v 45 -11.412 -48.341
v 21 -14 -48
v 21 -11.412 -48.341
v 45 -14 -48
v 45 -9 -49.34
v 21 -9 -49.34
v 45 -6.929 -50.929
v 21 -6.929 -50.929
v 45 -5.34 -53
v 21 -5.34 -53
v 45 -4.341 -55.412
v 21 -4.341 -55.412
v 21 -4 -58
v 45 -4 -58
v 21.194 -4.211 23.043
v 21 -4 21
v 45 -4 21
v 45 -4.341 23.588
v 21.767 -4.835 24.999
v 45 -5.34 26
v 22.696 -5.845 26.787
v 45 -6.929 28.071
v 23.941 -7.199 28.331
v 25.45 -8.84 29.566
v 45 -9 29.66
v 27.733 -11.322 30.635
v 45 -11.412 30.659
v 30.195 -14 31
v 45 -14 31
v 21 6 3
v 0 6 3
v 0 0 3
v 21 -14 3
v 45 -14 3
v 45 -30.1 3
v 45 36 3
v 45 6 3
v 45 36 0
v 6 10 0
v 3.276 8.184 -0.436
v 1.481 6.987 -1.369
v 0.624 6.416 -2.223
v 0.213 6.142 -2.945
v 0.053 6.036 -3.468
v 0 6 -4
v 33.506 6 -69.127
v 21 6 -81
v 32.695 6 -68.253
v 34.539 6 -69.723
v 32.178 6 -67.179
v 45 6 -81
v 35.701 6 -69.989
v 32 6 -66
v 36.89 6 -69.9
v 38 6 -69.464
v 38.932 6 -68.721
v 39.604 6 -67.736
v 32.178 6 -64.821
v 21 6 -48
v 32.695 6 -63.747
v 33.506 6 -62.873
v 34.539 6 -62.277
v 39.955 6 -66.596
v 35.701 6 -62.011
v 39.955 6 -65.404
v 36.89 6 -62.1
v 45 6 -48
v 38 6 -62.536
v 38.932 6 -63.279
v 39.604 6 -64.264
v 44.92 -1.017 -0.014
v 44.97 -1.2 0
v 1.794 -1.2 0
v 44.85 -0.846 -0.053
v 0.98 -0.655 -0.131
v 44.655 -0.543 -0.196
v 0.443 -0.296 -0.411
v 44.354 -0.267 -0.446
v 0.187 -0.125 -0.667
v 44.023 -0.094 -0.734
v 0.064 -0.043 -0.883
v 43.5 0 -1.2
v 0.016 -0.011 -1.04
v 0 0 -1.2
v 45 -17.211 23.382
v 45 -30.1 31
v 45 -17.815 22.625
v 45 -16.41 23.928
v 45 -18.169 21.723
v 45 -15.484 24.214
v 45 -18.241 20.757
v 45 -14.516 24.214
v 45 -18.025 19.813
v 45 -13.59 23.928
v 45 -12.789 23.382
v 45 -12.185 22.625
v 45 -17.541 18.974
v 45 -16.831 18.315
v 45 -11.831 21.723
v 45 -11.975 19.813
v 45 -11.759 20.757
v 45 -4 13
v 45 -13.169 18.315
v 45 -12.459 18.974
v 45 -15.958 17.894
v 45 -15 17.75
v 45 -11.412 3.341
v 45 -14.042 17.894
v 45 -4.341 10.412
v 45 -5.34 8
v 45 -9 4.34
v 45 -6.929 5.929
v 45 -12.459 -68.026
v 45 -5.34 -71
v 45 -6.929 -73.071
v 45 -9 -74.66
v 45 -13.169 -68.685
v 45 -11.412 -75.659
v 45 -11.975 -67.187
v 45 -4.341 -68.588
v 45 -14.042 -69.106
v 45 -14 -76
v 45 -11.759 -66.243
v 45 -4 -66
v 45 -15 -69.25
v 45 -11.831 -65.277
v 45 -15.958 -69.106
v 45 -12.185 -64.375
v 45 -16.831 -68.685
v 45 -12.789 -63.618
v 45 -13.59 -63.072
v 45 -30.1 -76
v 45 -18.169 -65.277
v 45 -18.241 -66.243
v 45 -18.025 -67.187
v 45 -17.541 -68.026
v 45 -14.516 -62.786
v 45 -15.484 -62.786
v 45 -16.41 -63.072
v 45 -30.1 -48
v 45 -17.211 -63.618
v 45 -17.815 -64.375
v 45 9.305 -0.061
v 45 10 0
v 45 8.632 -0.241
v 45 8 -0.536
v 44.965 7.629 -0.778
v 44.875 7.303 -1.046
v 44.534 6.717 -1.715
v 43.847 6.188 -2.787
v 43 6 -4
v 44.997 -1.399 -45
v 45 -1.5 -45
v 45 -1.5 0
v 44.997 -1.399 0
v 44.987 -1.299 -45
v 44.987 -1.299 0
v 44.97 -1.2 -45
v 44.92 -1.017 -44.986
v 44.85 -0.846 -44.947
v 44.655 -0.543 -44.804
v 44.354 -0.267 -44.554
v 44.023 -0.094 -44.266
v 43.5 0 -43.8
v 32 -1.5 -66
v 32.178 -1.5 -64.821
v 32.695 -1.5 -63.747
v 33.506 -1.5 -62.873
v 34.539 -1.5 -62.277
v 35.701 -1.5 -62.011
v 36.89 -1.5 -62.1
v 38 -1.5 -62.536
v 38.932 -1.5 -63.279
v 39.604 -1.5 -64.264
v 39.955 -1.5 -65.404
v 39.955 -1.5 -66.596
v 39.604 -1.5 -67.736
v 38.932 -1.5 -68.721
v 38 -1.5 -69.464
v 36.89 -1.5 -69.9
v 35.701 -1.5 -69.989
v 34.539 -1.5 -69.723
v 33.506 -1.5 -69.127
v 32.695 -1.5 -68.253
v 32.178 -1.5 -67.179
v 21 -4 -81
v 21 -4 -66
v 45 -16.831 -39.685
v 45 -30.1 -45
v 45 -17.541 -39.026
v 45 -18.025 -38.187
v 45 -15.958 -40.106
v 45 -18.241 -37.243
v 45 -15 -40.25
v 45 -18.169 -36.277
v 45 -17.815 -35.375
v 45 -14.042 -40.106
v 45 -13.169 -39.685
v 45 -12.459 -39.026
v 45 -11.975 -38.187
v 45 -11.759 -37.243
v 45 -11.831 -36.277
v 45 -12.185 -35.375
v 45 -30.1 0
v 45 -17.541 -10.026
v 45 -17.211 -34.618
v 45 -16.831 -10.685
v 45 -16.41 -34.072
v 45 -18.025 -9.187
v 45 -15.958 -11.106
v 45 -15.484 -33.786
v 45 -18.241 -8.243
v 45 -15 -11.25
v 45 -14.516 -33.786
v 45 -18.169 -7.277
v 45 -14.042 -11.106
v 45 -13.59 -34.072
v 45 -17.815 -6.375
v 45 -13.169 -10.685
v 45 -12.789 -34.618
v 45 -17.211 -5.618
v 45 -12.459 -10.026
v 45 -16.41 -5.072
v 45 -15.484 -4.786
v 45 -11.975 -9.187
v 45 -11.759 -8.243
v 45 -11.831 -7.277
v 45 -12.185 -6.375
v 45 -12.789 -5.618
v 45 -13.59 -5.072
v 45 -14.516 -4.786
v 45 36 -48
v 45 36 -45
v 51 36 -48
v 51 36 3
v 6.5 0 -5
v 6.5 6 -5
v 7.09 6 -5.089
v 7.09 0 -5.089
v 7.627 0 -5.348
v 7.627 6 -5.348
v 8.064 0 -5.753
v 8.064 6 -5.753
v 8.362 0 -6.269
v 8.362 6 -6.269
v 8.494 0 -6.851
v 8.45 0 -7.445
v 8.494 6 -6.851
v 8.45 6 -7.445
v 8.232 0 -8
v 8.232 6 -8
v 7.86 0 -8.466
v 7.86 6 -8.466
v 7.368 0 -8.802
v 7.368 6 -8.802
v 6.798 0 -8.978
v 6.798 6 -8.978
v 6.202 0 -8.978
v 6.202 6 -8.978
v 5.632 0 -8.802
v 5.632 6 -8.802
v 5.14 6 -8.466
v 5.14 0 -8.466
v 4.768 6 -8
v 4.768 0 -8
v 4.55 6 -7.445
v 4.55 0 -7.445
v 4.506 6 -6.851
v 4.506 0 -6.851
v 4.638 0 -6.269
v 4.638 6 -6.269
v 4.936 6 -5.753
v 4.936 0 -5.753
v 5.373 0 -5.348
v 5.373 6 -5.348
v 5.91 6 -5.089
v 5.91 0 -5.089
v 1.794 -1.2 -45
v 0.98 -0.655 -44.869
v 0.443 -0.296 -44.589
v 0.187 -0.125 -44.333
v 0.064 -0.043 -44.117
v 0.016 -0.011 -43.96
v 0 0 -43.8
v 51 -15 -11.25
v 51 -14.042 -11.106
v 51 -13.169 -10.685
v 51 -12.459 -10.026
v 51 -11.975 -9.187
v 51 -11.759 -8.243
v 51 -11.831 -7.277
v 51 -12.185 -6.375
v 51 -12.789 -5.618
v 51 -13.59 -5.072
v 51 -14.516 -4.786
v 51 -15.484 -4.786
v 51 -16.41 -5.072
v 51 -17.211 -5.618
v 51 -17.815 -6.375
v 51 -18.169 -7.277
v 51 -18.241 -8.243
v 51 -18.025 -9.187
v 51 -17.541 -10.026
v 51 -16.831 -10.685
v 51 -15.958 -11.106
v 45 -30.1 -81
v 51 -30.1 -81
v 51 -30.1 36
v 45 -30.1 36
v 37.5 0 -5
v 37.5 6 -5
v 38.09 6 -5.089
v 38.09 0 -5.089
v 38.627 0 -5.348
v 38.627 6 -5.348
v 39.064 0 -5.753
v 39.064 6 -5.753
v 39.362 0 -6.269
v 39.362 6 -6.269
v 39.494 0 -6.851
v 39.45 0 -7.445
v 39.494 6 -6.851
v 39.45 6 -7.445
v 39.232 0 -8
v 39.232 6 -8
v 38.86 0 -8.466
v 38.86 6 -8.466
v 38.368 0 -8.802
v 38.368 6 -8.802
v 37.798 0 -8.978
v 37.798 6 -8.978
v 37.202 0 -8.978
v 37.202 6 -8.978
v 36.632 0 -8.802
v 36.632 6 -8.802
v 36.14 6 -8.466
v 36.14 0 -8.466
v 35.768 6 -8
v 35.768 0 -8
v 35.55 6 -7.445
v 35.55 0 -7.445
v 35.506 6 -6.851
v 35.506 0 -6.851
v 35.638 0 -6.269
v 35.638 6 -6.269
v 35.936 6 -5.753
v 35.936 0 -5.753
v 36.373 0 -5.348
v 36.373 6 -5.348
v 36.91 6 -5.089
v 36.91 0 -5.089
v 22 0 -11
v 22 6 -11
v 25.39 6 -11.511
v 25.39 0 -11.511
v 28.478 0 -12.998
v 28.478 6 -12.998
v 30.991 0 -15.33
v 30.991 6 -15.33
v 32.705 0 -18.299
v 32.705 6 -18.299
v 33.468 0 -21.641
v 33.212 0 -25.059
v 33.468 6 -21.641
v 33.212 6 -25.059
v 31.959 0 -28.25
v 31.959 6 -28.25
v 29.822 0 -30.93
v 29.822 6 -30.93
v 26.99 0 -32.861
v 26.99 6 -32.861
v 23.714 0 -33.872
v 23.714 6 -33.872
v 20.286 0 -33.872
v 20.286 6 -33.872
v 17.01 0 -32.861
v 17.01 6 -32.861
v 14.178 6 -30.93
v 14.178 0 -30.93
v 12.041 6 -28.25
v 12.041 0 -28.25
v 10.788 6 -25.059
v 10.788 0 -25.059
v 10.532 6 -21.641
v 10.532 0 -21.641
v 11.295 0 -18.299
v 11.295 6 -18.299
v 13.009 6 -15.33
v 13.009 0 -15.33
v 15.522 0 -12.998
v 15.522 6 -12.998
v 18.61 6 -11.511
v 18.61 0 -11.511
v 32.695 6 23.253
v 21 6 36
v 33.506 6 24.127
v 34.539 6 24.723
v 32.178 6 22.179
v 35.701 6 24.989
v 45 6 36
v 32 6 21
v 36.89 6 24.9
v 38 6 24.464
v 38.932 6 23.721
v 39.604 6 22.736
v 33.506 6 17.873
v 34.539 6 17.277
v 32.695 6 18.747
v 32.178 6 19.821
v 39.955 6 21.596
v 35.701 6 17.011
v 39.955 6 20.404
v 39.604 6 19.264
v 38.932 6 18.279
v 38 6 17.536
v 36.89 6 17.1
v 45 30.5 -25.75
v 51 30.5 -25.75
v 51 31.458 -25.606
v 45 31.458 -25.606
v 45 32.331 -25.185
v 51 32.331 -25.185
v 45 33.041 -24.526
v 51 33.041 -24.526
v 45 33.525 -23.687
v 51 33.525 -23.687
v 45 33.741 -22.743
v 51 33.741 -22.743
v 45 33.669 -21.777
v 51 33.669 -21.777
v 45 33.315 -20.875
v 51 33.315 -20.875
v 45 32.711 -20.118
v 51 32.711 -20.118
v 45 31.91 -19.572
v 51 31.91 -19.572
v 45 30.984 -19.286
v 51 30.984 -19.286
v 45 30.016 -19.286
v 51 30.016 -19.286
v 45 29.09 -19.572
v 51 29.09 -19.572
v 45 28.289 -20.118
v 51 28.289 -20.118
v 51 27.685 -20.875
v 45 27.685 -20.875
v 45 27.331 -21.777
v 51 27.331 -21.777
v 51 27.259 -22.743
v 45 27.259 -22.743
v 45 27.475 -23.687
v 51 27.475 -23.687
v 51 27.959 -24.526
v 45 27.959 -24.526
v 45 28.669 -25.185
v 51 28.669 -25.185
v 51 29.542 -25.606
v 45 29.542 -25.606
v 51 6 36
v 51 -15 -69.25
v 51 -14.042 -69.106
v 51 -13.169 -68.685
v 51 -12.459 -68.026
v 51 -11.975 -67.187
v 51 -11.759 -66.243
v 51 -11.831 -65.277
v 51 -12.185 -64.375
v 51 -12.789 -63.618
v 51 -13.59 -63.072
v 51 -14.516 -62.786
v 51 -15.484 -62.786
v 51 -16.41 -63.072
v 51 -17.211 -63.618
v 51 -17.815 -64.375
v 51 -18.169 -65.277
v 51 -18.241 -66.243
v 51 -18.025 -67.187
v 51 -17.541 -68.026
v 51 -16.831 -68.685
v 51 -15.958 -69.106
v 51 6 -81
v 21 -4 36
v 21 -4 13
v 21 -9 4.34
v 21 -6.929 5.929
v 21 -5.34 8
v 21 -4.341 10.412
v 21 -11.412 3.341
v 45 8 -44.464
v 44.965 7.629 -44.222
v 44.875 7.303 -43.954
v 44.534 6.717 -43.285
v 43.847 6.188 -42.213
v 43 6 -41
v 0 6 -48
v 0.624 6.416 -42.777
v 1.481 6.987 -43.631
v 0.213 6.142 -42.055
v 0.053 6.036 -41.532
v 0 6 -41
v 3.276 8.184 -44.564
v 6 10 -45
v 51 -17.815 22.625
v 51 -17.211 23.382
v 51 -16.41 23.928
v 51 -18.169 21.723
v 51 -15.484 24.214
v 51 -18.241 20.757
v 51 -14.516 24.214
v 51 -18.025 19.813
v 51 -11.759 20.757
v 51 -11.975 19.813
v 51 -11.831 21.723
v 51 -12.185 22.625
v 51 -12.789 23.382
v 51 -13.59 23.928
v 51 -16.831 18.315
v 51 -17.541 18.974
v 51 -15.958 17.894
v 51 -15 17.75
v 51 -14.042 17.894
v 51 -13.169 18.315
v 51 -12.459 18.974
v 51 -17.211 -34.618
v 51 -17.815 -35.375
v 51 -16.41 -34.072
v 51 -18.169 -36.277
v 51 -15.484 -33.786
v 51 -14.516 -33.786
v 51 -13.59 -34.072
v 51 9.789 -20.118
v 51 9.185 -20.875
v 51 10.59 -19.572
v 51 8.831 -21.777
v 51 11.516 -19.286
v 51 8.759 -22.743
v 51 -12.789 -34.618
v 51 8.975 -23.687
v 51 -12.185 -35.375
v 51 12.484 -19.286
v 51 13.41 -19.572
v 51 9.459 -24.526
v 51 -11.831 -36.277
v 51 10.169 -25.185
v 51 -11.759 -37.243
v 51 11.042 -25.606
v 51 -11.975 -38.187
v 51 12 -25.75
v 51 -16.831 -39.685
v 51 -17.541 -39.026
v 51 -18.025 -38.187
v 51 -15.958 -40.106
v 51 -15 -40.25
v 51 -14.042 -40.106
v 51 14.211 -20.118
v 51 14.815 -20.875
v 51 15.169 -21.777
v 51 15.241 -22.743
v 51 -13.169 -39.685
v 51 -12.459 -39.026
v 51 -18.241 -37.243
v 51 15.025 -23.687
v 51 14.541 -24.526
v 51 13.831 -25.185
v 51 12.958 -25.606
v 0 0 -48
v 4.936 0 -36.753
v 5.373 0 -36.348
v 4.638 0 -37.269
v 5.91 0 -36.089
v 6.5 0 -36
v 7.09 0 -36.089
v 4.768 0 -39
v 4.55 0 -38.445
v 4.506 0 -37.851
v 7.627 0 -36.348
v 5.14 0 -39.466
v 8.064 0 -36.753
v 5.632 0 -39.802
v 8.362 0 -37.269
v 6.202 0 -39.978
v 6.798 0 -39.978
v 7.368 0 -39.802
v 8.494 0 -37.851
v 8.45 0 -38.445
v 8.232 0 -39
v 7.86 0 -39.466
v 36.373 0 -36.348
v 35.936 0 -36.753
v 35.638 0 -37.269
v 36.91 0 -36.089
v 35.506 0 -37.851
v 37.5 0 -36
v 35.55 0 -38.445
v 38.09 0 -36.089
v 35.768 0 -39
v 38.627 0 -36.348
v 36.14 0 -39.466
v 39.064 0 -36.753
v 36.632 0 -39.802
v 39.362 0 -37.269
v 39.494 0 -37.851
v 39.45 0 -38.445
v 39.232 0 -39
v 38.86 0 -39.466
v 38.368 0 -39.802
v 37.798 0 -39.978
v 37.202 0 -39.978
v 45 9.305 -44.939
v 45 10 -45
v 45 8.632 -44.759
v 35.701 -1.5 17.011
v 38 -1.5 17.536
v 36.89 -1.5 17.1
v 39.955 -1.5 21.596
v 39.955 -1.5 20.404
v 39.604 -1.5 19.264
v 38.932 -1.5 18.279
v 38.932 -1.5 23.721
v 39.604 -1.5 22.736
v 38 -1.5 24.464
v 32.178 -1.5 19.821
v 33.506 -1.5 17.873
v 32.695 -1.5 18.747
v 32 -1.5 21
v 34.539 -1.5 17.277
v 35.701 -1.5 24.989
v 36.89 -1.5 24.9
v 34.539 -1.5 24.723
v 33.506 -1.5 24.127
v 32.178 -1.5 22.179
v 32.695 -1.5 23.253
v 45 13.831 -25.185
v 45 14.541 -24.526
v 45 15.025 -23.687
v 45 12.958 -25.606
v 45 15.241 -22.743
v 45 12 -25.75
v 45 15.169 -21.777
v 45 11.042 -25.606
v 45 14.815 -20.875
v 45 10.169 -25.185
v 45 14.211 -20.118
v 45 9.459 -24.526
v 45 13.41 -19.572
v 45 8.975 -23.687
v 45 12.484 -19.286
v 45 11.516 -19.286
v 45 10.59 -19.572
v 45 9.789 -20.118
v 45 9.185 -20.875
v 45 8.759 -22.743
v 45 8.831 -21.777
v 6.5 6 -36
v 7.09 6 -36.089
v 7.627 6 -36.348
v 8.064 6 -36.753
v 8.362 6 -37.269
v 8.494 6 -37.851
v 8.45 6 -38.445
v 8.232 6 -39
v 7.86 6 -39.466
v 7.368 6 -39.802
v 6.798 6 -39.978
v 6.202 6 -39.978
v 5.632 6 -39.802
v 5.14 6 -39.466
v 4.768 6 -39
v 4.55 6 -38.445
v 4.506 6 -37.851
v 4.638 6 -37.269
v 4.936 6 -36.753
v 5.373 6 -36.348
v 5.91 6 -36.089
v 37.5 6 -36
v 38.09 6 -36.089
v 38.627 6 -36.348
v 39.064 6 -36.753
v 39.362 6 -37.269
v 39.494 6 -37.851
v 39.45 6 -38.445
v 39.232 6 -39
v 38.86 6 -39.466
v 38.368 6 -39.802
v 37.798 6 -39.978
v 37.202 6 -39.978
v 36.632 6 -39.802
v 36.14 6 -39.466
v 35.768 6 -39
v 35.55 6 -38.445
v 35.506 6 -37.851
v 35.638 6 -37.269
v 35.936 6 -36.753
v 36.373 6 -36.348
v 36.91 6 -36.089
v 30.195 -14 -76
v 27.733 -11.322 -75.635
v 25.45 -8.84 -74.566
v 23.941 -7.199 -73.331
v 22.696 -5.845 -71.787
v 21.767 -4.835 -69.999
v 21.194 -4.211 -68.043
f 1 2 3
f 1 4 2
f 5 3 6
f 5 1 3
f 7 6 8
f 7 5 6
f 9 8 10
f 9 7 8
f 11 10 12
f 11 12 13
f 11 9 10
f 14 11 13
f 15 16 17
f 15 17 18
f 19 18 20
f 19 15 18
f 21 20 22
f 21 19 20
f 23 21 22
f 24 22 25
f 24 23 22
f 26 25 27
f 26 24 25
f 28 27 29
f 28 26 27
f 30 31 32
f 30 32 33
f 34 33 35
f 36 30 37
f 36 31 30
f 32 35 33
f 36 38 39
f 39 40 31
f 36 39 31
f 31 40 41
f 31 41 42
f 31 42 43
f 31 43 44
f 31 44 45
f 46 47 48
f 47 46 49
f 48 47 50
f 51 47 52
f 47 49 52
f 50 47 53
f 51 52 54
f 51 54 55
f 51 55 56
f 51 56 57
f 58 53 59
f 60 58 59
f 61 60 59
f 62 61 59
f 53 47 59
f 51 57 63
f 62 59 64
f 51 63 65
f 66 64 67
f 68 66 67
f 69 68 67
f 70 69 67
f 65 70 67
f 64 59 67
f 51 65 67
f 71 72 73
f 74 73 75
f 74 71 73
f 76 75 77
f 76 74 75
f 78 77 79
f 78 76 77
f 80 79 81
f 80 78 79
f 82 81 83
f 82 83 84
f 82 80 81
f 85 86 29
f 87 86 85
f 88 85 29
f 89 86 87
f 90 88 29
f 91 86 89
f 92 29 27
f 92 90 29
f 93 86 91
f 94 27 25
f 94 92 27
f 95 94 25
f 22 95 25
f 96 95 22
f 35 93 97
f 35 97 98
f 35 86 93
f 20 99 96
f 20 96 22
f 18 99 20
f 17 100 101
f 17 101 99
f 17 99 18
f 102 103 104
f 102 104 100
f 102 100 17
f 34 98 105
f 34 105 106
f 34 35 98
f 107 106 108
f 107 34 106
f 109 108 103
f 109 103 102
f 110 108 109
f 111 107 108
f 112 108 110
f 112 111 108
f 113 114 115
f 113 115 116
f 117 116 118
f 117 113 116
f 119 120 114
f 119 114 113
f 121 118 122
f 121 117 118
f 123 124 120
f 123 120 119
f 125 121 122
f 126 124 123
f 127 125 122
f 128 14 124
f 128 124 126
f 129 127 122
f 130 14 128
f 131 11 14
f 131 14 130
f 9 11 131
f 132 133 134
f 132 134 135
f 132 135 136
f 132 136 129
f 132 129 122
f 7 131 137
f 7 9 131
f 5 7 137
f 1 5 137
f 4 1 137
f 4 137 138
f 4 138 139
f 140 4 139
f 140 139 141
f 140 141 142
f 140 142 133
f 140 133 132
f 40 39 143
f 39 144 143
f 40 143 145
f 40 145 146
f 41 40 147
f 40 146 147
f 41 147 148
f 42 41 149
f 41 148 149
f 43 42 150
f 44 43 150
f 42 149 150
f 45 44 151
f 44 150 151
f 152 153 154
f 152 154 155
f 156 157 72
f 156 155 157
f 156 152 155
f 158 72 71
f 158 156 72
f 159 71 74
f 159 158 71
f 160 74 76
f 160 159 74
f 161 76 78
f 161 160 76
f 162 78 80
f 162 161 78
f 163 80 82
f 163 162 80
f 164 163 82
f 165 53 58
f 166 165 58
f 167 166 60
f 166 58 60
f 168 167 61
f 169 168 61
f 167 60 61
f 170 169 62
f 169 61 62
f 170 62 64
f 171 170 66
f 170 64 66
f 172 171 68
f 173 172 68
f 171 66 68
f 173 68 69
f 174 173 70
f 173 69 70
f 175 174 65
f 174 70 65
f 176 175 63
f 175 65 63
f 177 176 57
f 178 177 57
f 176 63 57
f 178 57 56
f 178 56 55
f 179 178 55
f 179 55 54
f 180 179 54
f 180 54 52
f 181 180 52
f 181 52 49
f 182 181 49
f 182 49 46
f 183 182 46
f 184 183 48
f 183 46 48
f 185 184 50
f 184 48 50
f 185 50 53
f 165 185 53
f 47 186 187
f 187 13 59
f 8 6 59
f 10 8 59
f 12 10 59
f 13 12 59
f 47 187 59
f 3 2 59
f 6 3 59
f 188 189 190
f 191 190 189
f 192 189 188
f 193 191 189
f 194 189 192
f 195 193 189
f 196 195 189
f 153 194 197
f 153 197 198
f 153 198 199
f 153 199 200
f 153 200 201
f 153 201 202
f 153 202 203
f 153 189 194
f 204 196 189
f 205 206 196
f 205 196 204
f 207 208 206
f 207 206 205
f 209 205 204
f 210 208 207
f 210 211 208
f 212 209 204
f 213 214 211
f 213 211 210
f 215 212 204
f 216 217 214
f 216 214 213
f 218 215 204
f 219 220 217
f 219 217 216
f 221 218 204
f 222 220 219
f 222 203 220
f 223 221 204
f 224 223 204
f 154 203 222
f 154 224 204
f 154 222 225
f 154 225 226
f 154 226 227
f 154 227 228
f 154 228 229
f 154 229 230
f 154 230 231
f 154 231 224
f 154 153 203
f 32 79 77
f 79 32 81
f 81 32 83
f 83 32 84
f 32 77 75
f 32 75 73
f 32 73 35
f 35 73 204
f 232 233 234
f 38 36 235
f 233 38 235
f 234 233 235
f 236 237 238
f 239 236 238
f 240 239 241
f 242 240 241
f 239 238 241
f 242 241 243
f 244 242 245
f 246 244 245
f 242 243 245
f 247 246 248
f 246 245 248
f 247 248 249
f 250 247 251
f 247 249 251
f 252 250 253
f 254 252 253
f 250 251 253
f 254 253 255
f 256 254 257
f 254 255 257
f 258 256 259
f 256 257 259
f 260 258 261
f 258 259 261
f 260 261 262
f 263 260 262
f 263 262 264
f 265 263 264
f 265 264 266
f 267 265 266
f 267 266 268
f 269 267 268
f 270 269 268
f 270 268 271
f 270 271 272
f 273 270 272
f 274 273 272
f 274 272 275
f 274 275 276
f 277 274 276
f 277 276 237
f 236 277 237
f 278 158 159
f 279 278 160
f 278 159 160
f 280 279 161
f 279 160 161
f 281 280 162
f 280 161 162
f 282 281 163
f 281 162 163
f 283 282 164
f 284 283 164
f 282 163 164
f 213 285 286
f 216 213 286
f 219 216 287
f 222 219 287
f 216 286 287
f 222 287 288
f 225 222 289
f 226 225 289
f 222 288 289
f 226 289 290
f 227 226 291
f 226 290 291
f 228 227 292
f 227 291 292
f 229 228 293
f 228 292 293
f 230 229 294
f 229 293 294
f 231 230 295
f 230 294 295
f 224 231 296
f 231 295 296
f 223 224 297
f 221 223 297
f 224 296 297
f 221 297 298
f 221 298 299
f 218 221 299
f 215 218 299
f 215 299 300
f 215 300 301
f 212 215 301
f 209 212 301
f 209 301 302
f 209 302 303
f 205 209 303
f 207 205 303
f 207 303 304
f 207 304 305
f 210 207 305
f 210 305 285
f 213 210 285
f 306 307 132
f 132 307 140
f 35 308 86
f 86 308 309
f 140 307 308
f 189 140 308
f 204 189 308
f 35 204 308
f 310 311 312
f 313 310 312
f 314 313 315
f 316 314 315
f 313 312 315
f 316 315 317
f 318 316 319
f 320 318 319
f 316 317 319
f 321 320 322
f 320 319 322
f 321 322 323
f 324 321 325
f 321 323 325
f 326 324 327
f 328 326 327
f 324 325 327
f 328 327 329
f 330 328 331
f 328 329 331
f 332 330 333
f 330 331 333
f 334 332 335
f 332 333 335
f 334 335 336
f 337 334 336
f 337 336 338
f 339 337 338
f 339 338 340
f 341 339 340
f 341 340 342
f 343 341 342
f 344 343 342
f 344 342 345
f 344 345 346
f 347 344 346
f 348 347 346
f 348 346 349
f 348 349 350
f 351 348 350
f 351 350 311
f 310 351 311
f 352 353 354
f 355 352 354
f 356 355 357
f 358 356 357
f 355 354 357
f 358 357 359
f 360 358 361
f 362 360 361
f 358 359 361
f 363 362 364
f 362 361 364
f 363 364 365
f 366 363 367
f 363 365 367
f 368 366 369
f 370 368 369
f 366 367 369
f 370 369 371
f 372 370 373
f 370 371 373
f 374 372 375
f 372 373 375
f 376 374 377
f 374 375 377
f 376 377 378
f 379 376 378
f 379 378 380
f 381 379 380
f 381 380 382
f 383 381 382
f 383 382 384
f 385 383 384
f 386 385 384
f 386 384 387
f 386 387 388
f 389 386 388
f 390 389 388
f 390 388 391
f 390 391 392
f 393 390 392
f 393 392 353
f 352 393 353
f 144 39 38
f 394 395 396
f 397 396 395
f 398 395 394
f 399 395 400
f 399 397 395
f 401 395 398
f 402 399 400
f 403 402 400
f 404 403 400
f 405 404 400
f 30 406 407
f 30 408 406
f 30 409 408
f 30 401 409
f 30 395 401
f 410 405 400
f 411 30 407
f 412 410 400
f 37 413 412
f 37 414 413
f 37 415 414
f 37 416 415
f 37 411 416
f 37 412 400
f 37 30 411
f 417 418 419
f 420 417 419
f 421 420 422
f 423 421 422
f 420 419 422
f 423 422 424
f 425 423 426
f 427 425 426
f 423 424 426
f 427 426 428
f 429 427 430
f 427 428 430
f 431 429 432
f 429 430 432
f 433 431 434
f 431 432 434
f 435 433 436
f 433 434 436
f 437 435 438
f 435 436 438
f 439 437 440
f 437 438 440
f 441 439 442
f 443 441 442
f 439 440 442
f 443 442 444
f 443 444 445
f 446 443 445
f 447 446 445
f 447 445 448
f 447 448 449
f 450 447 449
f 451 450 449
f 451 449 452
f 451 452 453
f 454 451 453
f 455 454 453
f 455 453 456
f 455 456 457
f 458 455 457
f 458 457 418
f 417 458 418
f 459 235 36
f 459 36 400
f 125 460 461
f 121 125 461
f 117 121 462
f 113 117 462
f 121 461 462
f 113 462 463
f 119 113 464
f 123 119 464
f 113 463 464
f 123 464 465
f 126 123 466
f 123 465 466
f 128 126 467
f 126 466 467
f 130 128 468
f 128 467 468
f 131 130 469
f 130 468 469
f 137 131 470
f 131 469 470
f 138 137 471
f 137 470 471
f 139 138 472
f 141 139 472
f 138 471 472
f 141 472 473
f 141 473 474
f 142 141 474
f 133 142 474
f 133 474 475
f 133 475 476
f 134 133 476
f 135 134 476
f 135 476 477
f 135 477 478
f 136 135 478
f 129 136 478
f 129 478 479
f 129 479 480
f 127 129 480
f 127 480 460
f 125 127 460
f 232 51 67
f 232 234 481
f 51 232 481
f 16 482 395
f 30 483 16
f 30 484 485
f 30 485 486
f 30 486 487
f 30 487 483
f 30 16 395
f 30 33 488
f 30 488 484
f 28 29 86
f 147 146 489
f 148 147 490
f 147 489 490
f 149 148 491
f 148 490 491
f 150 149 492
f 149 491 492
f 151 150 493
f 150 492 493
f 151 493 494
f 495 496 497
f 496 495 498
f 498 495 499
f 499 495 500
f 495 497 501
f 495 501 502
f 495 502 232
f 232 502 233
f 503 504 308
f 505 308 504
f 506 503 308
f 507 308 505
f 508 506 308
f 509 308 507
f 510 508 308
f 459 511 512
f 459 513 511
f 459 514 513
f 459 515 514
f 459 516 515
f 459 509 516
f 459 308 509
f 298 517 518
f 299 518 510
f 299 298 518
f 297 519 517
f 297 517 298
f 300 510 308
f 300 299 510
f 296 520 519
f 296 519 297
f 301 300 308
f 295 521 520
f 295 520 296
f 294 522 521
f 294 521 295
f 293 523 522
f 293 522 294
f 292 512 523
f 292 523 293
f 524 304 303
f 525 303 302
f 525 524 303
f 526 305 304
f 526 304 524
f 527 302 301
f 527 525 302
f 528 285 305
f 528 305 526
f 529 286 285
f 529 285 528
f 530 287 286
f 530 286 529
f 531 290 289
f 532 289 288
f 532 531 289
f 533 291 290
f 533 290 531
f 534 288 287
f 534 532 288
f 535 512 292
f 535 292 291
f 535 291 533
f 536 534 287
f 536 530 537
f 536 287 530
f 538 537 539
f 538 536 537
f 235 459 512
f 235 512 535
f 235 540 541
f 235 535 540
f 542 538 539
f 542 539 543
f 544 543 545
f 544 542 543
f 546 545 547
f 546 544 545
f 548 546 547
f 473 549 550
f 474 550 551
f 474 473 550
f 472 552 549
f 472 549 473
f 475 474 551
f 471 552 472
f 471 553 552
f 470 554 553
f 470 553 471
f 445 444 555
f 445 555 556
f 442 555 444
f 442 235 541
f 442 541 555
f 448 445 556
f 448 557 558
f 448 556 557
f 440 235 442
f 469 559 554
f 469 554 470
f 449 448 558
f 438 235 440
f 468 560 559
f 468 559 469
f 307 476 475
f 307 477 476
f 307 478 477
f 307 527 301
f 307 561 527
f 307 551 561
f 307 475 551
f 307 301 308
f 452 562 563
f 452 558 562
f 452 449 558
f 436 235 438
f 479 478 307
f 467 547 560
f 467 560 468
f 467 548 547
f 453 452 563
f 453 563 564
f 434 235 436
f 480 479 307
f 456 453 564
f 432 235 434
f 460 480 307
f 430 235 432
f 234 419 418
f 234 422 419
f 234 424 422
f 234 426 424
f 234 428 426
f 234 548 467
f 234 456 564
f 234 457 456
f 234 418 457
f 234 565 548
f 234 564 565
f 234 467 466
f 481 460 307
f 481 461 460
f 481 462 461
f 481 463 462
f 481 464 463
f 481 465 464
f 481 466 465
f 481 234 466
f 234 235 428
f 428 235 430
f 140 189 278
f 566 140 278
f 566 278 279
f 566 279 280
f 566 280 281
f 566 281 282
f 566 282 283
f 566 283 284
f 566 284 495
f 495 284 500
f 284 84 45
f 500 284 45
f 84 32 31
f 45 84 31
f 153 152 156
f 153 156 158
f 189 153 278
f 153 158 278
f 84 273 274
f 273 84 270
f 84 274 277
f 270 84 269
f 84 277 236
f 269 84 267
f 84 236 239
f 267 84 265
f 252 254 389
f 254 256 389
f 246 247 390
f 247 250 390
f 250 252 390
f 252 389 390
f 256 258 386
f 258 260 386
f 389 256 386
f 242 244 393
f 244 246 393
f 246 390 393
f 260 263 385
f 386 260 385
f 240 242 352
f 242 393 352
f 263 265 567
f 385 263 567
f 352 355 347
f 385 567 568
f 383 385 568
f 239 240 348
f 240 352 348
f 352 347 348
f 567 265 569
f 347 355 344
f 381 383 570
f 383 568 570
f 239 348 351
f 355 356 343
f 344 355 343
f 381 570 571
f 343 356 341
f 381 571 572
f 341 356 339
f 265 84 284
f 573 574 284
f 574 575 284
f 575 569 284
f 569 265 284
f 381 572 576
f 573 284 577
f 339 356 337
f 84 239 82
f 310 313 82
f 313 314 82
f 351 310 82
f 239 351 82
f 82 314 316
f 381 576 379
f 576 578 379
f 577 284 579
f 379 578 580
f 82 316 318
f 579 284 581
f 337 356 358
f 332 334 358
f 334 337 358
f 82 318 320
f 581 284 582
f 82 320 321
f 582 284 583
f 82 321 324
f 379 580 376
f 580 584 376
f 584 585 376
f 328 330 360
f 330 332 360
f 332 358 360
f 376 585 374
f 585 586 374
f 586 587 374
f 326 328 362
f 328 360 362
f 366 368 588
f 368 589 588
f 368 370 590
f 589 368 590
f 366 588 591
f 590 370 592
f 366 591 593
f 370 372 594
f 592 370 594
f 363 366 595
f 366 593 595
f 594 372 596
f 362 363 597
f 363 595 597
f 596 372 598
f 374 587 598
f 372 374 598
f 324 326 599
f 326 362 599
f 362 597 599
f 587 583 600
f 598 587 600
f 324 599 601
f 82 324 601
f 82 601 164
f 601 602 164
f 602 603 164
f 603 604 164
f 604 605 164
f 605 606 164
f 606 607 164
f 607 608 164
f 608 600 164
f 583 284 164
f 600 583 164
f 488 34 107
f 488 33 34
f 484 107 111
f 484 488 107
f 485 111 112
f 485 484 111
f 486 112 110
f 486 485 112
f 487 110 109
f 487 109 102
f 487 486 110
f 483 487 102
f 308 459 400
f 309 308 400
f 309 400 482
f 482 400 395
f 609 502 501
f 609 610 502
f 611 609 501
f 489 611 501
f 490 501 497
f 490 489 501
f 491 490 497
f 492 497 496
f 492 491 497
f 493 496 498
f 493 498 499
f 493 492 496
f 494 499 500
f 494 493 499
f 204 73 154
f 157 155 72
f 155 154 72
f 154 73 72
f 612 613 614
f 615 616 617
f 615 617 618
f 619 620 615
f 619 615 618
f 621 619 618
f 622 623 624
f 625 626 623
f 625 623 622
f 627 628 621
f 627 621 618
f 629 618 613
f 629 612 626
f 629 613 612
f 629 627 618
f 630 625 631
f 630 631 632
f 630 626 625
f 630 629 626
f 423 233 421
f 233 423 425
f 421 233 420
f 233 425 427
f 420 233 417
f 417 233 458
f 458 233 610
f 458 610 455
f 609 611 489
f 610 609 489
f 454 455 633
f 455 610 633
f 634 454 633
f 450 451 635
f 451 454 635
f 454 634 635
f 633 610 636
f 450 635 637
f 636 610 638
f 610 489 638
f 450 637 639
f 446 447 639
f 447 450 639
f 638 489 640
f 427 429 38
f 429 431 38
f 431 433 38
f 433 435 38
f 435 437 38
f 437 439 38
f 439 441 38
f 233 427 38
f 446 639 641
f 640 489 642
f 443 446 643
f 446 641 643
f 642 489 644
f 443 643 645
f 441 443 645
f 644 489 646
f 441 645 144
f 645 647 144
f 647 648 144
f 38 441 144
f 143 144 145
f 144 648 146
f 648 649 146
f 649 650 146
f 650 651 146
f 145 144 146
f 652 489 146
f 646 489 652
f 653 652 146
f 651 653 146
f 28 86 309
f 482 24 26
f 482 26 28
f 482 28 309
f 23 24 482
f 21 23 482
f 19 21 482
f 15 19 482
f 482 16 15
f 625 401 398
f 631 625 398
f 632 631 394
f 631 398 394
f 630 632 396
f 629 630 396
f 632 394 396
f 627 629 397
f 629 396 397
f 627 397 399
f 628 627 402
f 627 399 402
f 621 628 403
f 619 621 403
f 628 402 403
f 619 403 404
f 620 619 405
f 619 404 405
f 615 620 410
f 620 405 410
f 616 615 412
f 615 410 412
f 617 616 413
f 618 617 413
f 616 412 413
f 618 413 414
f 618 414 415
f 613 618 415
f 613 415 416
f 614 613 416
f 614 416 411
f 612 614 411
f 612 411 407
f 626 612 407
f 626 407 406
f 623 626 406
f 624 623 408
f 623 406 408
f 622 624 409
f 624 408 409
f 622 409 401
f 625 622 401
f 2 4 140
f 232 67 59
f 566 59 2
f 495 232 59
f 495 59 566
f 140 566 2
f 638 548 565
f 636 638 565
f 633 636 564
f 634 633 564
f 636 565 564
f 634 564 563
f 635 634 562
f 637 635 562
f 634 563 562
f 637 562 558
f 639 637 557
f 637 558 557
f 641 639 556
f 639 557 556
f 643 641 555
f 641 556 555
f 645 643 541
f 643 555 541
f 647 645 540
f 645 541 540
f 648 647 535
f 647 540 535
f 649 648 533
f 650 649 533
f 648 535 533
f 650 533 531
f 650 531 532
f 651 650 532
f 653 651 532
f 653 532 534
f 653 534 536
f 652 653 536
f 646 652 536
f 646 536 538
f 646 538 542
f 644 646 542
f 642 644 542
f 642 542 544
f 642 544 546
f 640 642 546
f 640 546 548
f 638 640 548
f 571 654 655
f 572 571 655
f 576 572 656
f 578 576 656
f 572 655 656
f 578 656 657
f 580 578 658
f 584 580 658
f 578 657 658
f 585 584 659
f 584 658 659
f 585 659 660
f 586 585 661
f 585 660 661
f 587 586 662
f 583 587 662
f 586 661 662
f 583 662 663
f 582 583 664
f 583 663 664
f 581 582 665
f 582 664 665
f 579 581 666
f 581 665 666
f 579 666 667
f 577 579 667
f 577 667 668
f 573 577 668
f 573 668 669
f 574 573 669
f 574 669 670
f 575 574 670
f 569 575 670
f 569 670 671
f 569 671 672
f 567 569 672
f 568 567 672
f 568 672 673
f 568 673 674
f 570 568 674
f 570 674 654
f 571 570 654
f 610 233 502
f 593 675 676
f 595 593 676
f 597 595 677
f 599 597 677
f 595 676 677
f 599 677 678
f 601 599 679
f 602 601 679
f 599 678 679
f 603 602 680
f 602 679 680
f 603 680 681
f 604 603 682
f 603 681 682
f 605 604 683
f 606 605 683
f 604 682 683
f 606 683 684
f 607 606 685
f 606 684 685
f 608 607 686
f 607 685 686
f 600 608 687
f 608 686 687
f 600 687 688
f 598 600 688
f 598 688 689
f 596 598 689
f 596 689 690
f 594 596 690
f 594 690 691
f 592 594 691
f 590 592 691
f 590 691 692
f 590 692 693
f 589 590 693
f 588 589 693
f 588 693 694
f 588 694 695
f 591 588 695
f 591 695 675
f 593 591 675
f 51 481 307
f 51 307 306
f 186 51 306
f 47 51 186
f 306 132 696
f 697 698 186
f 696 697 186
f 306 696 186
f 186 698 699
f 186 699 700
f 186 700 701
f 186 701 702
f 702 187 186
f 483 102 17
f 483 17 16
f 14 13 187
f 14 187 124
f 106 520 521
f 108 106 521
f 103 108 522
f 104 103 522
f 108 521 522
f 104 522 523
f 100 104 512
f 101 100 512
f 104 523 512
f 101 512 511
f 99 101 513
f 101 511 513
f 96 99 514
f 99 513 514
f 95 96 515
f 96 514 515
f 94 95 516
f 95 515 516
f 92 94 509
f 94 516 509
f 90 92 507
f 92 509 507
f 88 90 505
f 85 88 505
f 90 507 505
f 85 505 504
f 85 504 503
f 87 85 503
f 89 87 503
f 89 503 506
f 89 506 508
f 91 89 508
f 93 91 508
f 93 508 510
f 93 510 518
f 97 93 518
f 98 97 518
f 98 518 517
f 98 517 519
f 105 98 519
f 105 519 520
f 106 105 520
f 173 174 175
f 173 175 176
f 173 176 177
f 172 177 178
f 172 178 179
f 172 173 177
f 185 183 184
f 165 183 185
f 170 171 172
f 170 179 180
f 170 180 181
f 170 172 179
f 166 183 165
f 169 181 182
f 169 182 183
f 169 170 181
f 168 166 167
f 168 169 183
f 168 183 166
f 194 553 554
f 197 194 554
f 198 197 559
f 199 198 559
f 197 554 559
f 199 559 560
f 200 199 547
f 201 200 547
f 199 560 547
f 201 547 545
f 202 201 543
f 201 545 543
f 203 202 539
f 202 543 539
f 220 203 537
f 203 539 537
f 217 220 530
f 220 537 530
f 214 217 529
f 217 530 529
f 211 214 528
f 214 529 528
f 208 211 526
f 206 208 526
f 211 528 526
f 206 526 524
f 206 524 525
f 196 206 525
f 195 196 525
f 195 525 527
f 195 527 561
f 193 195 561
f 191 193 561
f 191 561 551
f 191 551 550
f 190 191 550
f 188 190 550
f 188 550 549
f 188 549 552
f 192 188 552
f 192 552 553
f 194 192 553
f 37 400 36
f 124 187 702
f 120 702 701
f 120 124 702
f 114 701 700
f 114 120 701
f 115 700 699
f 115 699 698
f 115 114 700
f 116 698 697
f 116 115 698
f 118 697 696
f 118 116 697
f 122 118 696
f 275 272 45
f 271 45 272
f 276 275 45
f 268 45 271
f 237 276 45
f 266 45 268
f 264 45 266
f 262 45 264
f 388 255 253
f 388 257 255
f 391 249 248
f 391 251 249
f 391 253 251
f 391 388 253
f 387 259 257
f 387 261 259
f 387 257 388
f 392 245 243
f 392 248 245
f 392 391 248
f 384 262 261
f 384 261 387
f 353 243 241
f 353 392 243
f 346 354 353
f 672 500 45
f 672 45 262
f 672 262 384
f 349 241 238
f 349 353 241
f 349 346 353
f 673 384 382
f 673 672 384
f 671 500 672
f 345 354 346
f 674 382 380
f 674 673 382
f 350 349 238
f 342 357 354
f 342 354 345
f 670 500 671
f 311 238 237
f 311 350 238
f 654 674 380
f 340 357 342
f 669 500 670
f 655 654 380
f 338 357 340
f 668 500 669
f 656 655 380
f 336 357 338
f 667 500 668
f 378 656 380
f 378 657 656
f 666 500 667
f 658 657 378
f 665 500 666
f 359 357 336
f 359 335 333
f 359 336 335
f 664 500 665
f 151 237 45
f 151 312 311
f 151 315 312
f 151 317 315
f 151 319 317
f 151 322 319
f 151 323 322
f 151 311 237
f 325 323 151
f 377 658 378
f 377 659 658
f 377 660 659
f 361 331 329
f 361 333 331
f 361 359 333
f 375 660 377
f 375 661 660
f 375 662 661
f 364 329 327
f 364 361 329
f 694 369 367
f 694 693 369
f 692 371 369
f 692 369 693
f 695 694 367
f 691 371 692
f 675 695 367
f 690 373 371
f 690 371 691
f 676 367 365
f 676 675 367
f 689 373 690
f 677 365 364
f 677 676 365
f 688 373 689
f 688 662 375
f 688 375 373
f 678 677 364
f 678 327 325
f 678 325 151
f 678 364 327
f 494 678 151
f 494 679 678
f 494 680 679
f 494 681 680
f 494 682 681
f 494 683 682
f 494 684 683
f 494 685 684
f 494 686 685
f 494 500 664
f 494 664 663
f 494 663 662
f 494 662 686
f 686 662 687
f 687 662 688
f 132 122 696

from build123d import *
from OCP.BRepFilletAPI import BRepFilletAPI_MakeFillet

# Parameters (mm, degrees)
SKETCH2_W                  = 45
SKETCH2_H                  = 45
BOSS_EXTRUDE1_DEPTH        = 6
SKETCH4_R                  = 11.5
SKETCH4_R_2                = 2
CUT_EXTRUDE1_DEPTH         = 64.921827258
SKETCH5_W                  = 6
SKETCH5_H                  = 45
BOSS_EXTRUDE2_DEPTH        = 30.1
BOSS_EXTRUDE2_DEPTH_BACK   = 36
BOSS_EXTRUDE3_DEPTH        = 3
BOSS_EXTRUDE4_DEPTH        = 3
BOSS_EXTRUDE5_DEPTH        = 28
BOSS_EXTRUDE6_DEPTH        = 5
FILLET3_R                  = 10
FILLET4_R1                 = 4
FILLET4_R2                 = 2
FILLET4_R3                 = 1.2
FILLET4_R4                 = 1.5
BOSS_EXTRUDE7_DEPTH        = 28
BOSS_EXTRUDE8_DEPTH        = 5
FILLET5_R                  = 10
F_6_5_6_5_DIAMETER_HOLE1_D = 6.5
SKETCH14_R                 = 4
CUT_EXTRUDE2_DEPTH         = 7.5
BOSS_EXTRUDE9_DEPTH        = 6


with BuildPart() as part:
    # Sketch2 → Boss-Extrude1 (new body)
    with BuildSketch(Plane(origin=(0, 0, 0), x_dir=(1, 0, 0), z_dir=(0, 1, 0))):
        with Locations((22.5, 22.5)):
            Rectangle(SKETCH2_W, SKETCH2_H)
    extrude(amount=BOSS_EXTRUDE1_DEPTH)

    # Sketch4 → Cut-Extrude1 (cut, through all)
    with BuildSketch(Plane(origin=(0, 6, 0), x_dir=(-1, 0, 0), z_dir=(0, 1, 0))):
        with Locations(Location((-22, -22.5, 0), (0, 0, 90))):
            Circle(SKETCH4_R)
        with Locations(Location((-37.5, -7, 0), (0, 0, 90))):
            Circle(SKETCH4_R_2)
        with Locations(Location((-6.5, -7, 0), (0, 0, 90))):
            Circle(SKETCH4_R_2)
        with Locations(Location((-6.5, -38, 0), (0, 0, 90))):
            Circle(SKETCH4_R_2)
        with Locations(Location((-37.5, -38, 0), (0, 0, 90))):
            Circle(SKETCH4_R_2)
    extrude(amount=-CUT_EXTRUDE1_DEPTH, mode=Mode.SUBTRACT)

    # Sketch5 → Boss-Extrude2 (add, two sides)
    with BuildSketch(Plane.XZ) as boss_extrude2_sk:
        with Locations((48, -22.5)):
            Rectangle(SKETCH5_W, SKETCH5_H)
    extrude(amount=BOSS_EXTRUDE2_DEPTH)
    extrude(boss_extrude2_sk.sketch, amount=-BOSS_EXTRUDE2_DEPTH_BACK)

    # Sketch8 → Boss-Extrude3 (add)
    with BuildSketch(Plane.XY):
        Polygon((45, 36), (0, 6), (0, 0), (45, -30.1), (51, -30.1), (51, 36), align=None)
    extrude(amount=BOSS_EXTRUDE3_DEPTH)

    # Sketch9 → Boss-Extrude4 (add)
    with BuildSketch(Plane(origin=(0, 0, -45), x_dir=(-1, 0, 0), z_dir=(0, 0, -1))):
        Polygon((0, 6), (-45, 36), (-51, 36), (-51, -30.1), (-45, -30.1), (0, 0), align=None)
    extrude(amount=BOSS_EXTRUDE4_DEPTH)

    # Sketch11 → Boss-Extrude5 (add)
    with BuildSketch(Plane.XY.offset(3)):
        Polygon((51, -30.1), (45, -30.1), (45, -4), (21, -4), (21, 6), (51, 6), align=None)
    extrude(amount=BOSS_EXTRUDE5_DEPTH)

    # Sketch12 → Boss-Extrude6 (add)
    with BuildSketch(Plane.XY.offset(31)):
        Polygon((45, -30.1), (21, -4), (21, 6), (51, 6), (51, -30.1), align=None)
    extrude(amount=BOSS_EXTRUDE6_DEPTH)

    # Fillet3
    fillet3_edges = [part.edges().sort_by_distance(p)[0] for p in [
        (33, -4, 3),
        (33, -4, 31),
    ]]
    fillet(fillet3_edges, radius=FILLET3_R)

    # Fillet4: one fillet with a radius per group of edges: ONE call of the kernel's fillet builder (fillet() takes one radius for all edges)
    fillet4_edges_1 = [part.edges().sort_by_distance(p)[0] for p in [
        (22.5, 6, -45),
        (22.5, 6, 0),
    ]]
    fillet4_edges_2 = [part.edges().sort_by_distance(p)[0] for p in [
        (45, 6, -22.5),
    ]]
    fillet4_edges_3 = [part.edges().sort_by_distance(p)[0] for p in [
        (22.5, 0, -45),
        (22.5, 0, 0),
    ]]
    fillet4_edges_4 = [part.edges().sort_by_distance(p)[0] for p in [
        (45, 0, -22.5),
    ]]
    fillet4 = BRepFilletAPI_MakeFillet(part.part.solid().wrapped)
    for e in fillet4_edges_1:
        fillet4.Add(FILLET4_R1, e.wrapped)
    for e in fillet4_edges_2:
        fillet4.Add(FILLET4_R2, e.wrapped)
    for e in fillet4_edges_3:
        fillet4.Add(FILLET4_R3, e.wrapped)
    for e in fillet4_edges_4:
        fillet4.Add(FILLET4_R4, e.wrapped)
    add(Compound.cast(fillet4.Shape()), mode=Mode.REPLACE)

    # Sketch15 → Boss-Extrude7 (add)
    with BuildSketch(Plane(origin=(0, 0, -48), x_dir=(-1, 0, 0), z_dir=(0, 0, -1))):
        Polygon((-51, -30.1), (-51, 6), (-21, 6), (-21, -4), (-45, -4), (-45, -30.1), align=None)
    extrude(amount=BOSS_EXTRUDE7_DEPTH)

    # Sketch16 → Boss-Extrude8 (add)
    with BuildSketch(Plane(origin=(0, 0, -76), x_dir=(-1, 0, 0), z_dir=(0, 0, -1))):
        Polygon((-45, -30.1), (-21, -4), (-21, 6), (-51, 6), (-51, -30.1), align=None)
    extrude(amount=BOSS_EXTRUDE8_DEPTH)

    # Fillet5
    fillet5_edges = [part.edges().sort_by_distance(p)[0] for p in [
        (33, -4, -48),
        (33, -4, -76),
    ]]
    fillet(fillet5_edges, radius=FILLET5_R)

    # 6.5 _6.5_ Diameter Hole1 (through all)
    with Locations(Plane.ZY.offset(-45)):
        with Locations((-22.5, 12), (-22.5, 30.5), (-37, -15), (-8, -15), (21, -15), (-66, -15)):
            Hole(F_6_5_6_5_DIAMETER_HOLE1_D / 2)

    # Sketch14 → Cut-Extrude2 (cut)
    with BuildSketch(Plane(origin=(0, 6, 0), x_dir=(1, 0, 0), z_dir=(0, 1, 0))):
        with Locations(Location((36, -21, 0), (0, 0, 180))):
            Circle(SKETCH14_R)
        with Locations(Location((36, 66, 0), (0, 0, 180))):
            Circle(SKETCH14_R)
    extrude(amount=-CUT_EXTRUDE2_DEPTH, mode=Mode.SUBTRACT)

    # Sketch17 → Boss-Extrude9 (add)
    with BuildSketch(Plane(origin=(51, 0, 0), x_dir=(0, 0, -1), z_dir=(1, 0, 0))):
        Polygon((-3, 36), (-36, 6), (-3, 6), align=None)
        Polygon((48, 36), (81, 6), (48, 6), align=None)
    extrude(amount=-BOSS_EXTRUDE9_DEPTH)


solid = part.part
